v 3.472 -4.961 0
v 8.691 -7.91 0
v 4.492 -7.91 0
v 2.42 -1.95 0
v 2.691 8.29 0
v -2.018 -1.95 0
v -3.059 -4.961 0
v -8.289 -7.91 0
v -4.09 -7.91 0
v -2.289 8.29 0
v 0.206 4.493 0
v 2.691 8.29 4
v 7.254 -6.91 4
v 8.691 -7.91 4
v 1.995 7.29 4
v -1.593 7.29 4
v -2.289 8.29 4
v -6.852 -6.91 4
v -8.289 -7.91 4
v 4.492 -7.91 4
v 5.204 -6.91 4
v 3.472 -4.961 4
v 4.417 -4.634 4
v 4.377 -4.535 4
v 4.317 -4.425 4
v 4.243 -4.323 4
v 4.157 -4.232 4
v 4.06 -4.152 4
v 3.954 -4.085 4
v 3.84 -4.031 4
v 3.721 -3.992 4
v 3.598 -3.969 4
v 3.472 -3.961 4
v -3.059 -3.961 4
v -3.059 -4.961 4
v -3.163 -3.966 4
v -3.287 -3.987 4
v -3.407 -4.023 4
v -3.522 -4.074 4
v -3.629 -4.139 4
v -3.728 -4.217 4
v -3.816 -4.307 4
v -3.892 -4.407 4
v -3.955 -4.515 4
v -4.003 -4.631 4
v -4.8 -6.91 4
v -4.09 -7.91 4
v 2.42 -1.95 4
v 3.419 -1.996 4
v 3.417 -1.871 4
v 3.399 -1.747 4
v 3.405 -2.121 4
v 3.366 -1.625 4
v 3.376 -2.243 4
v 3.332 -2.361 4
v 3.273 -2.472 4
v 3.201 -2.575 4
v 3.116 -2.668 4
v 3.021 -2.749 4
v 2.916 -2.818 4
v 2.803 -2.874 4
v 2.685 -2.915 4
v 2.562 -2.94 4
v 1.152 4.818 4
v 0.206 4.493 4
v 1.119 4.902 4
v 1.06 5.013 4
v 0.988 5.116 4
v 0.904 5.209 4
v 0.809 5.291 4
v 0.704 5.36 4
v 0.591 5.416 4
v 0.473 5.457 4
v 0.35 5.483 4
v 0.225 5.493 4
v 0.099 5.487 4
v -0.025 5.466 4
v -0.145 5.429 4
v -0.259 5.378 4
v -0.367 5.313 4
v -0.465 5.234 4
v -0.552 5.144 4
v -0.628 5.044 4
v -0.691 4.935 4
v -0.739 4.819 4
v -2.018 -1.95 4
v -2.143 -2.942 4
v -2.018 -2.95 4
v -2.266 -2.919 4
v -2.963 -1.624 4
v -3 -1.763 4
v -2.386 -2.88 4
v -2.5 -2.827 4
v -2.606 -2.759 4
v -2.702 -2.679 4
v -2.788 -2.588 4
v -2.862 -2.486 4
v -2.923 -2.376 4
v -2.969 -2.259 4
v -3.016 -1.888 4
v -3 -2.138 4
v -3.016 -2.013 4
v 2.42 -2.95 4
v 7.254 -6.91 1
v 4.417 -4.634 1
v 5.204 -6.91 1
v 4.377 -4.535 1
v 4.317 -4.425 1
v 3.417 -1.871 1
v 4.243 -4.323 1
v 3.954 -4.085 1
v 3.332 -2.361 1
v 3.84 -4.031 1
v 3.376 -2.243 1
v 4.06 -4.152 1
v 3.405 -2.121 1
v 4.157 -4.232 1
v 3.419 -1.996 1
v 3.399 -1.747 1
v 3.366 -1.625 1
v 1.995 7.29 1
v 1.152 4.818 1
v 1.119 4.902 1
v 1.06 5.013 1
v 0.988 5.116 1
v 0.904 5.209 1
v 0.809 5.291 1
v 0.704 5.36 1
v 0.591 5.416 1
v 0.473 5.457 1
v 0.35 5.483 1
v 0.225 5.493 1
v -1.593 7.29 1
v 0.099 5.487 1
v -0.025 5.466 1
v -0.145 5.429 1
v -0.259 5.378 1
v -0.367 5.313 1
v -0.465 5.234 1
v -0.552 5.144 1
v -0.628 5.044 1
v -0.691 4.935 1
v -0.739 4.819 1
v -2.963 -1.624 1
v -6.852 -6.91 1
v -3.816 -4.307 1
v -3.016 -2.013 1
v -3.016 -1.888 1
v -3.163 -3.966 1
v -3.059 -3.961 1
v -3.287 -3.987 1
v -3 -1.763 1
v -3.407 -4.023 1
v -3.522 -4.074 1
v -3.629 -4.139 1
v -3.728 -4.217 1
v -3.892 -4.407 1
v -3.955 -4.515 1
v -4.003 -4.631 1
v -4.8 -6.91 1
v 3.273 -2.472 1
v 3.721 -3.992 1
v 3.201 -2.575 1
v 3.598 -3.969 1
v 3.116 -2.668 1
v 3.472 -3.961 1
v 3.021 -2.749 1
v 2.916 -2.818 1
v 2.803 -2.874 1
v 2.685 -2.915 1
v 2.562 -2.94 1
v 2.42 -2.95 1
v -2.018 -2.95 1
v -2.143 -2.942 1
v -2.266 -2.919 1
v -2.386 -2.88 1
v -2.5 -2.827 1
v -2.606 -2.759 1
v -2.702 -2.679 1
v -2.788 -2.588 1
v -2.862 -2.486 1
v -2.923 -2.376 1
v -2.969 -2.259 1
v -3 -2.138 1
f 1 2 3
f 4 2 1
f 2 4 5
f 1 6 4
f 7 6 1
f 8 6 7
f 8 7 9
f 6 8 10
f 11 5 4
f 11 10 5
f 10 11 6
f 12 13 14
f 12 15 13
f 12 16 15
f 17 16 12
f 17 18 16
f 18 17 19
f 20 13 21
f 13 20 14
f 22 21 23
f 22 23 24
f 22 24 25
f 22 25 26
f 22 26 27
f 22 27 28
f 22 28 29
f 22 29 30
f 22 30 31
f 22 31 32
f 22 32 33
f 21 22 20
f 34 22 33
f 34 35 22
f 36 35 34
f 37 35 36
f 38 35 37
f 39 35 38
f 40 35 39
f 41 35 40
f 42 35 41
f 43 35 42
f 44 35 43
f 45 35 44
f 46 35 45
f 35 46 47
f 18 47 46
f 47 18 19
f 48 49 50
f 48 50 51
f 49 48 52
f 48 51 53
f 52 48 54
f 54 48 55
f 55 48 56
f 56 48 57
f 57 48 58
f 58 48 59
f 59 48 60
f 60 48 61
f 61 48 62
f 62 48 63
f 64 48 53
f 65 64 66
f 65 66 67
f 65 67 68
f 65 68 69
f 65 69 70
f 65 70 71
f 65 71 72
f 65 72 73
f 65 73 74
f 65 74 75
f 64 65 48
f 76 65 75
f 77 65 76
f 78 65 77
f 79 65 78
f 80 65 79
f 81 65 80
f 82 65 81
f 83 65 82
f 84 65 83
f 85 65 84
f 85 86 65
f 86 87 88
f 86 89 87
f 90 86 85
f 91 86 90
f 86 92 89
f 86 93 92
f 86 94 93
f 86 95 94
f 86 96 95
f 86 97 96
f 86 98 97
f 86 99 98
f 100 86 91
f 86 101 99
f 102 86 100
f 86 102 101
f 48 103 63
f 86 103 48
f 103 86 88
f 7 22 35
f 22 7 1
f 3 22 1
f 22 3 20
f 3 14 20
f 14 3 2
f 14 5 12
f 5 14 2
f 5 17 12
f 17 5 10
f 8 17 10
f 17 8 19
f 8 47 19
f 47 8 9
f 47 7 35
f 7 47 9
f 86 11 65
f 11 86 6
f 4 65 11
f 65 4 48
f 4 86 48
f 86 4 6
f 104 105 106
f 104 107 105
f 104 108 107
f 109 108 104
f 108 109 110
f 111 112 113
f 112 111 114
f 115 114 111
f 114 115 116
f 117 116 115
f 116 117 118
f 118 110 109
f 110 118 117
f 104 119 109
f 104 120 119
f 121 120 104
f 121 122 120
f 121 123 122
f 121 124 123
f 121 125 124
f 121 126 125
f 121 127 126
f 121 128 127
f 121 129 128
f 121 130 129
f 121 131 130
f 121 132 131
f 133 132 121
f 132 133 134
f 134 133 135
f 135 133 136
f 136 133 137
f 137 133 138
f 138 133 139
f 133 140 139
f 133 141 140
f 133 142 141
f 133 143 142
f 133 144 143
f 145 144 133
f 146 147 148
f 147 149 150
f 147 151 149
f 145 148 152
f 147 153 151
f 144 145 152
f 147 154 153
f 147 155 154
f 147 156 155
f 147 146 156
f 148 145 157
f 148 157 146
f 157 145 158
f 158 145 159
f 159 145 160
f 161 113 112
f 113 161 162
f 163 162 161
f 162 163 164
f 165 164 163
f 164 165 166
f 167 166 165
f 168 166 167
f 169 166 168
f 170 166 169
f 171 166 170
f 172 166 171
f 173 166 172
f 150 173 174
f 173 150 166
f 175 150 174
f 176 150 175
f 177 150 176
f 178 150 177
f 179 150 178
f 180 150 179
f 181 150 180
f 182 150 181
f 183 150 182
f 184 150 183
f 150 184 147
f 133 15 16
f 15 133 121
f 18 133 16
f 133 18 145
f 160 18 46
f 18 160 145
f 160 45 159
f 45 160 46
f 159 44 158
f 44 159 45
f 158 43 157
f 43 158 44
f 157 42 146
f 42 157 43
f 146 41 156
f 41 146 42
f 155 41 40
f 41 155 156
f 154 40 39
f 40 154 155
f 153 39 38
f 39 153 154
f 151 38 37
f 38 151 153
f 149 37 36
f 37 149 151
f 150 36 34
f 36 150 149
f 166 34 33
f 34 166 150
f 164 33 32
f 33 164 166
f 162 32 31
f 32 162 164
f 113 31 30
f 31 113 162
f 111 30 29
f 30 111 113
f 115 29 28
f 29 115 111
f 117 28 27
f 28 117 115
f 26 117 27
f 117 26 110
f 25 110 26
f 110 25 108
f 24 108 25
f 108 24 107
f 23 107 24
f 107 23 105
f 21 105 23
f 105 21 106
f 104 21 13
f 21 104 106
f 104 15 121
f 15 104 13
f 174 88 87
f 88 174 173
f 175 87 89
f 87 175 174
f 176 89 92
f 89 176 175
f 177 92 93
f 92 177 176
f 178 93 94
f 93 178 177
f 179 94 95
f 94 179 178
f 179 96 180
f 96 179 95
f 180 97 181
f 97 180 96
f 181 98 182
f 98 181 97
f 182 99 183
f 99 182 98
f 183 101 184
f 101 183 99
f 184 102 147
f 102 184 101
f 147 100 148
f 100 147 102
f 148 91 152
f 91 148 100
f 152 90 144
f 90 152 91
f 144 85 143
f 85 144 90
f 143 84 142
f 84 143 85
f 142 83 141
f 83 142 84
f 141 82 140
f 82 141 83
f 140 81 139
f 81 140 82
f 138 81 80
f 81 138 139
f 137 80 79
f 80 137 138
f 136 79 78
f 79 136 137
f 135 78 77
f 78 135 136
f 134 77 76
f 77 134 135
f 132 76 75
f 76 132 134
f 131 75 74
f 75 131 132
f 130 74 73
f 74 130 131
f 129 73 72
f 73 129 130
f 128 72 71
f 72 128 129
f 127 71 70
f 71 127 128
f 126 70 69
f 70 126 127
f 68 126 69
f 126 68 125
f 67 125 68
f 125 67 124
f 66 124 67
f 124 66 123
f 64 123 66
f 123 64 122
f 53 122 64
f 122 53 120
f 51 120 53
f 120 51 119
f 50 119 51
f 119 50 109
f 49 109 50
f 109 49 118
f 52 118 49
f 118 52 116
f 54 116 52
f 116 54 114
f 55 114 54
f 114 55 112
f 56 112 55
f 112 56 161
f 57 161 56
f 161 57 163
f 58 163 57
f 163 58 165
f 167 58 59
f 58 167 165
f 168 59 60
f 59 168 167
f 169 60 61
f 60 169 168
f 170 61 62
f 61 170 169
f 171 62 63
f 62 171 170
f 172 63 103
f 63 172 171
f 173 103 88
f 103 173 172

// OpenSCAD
$fn = 50;

difference() {
	union() {
		difference() {
			linear_extrude(height = 4) {
				text(font = "DejaVu Sans:style=Bold", halign = "center", size = 16, text = "A", valign = "center");
			}
			translate(v = [0, 0, 1]) {
				linear_extrude(height = 3) {
					offset(r = -1) {
						text(font = "DejaVu Sans:style=Bold", halign = "center", size = 16, text = "A", valign = "center");
					}
				}
			}
		}
	}
	union();
}
